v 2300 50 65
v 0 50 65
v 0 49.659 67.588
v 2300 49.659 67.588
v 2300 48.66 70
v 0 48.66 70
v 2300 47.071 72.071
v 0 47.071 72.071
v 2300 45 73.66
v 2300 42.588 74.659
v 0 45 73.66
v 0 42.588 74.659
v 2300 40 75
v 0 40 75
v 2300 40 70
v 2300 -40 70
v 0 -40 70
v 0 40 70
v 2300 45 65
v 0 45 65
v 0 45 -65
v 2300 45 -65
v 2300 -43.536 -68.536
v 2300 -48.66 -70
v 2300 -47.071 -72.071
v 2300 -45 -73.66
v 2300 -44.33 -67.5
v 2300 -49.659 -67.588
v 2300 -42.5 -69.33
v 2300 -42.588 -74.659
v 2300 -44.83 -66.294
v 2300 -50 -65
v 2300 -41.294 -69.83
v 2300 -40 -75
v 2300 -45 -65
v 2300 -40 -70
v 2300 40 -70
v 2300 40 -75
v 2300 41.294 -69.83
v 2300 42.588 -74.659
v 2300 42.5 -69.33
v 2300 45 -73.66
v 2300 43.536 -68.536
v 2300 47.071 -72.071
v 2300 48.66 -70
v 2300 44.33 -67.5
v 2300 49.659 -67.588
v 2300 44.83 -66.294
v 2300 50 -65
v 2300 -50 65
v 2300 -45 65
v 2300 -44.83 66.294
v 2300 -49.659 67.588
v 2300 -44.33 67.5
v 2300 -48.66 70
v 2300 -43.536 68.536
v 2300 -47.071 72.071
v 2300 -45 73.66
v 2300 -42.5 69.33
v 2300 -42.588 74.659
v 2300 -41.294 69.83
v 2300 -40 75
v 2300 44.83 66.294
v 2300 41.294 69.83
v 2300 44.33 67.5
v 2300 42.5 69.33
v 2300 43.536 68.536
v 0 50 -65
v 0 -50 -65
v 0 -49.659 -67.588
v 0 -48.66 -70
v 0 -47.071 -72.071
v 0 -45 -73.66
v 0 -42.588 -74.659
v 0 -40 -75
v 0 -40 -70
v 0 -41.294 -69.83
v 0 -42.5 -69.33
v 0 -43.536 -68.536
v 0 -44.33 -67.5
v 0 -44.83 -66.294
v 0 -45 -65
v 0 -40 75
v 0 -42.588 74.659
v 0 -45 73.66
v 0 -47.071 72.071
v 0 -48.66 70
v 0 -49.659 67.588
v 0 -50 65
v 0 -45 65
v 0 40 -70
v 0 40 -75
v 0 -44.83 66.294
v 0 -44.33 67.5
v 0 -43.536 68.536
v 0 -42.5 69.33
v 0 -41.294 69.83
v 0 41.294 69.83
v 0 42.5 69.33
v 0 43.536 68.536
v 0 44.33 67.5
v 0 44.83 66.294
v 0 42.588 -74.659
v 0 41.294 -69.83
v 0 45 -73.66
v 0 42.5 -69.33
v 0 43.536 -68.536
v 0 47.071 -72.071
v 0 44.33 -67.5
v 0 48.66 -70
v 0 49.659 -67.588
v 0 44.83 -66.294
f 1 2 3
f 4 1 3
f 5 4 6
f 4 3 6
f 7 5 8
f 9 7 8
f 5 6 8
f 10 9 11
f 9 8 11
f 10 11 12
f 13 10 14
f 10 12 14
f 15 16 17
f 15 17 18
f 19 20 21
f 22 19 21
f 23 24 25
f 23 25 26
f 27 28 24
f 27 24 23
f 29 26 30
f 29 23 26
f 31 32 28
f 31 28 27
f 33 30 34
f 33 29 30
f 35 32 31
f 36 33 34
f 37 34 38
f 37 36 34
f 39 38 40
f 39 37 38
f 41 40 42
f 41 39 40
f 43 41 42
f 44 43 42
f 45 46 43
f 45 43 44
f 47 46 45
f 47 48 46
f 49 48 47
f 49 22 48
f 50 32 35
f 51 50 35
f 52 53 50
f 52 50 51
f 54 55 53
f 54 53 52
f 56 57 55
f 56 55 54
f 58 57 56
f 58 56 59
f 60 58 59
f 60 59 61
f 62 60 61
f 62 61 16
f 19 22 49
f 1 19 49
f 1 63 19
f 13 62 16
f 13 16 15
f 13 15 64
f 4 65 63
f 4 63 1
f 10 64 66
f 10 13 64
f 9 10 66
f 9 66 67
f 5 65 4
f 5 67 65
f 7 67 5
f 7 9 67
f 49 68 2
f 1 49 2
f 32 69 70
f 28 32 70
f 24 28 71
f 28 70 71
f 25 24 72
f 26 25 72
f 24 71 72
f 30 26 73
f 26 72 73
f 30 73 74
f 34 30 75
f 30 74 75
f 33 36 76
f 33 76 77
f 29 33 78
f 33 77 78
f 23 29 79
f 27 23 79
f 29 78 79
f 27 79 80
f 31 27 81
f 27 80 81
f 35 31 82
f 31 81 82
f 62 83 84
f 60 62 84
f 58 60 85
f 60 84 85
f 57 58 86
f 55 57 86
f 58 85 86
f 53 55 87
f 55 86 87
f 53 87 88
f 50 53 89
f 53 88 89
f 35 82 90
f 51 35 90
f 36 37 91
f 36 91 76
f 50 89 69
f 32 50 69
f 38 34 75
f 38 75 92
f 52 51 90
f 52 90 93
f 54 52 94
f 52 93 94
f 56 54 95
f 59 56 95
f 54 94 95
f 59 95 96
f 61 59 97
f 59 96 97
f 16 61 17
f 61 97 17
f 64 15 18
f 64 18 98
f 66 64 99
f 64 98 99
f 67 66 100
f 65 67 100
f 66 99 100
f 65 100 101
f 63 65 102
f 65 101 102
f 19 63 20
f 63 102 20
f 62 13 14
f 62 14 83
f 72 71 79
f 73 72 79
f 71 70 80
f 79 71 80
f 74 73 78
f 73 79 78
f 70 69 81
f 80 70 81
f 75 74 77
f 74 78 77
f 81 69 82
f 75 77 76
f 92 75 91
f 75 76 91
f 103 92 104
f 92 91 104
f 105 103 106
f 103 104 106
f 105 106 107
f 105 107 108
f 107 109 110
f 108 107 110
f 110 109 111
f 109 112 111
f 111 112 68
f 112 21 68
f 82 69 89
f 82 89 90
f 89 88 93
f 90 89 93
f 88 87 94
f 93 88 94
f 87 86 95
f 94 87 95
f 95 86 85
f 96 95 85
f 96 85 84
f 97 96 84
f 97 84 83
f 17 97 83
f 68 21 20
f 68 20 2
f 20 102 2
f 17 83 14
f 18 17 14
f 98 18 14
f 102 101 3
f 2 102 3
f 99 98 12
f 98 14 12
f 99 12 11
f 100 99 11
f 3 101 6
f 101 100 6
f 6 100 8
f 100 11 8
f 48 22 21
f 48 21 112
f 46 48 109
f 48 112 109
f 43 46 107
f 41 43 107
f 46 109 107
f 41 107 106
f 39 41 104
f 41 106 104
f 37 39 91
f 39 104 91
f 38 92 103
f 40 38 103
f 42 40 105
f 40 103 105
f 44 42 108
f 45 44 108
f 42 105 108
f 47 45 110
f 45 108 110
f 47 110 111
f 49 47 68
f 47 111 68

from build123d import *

# Parameters (mm, degrees)
F1_DEPTH = 2300


with BuildPart() as f1:
    # F0 (on Right) → F1 (new body)
    with BuildSketch(Plane.YZ):
        with BuildLine():
            ThreePointArc((50, 65), (47.071068, 72.071068), (40, 75))
            Line((40, 75), (-40, 75))
            ThreePointArc((-40, 75), (-47.071068, 72.071068), (-50, 65))
            Line((-50, 65), (-50, -65))
            ThreePointArc((-50, -65), (-47.071068, -72.071068), (-40, -75))
            Line((-40, -75), (40, -75))
            ThreePointArc((40, -75), (47.071068, -72.071068), (50, -65))
            Line((50, -65), (50, 65))
        make_face()
        with BuildLine():
            ThreePointArc((45, -65), (43.535534, -68.535534), (40, -70))
            Line((40, -70), (-40, -70))
            ThreePointArc((-40, -70), (-43.535534, -68.535534), (-45, -65))
            Line((-45, -65), (-45, 65))
            ThreePointArc((-45, 65), (-43.535534, 68.535534), (-40, 70))
            Line((-40, 70), (40, 70))
            ThreePointArc((40, 70), (43.535534, 68.535534), (45, 65))
            Line((45, 65), (45, -65))
        make_face(mode=Mode.SUBTRACT)
    extrude(amount=F1_DEPTH)


solid = f1.part
